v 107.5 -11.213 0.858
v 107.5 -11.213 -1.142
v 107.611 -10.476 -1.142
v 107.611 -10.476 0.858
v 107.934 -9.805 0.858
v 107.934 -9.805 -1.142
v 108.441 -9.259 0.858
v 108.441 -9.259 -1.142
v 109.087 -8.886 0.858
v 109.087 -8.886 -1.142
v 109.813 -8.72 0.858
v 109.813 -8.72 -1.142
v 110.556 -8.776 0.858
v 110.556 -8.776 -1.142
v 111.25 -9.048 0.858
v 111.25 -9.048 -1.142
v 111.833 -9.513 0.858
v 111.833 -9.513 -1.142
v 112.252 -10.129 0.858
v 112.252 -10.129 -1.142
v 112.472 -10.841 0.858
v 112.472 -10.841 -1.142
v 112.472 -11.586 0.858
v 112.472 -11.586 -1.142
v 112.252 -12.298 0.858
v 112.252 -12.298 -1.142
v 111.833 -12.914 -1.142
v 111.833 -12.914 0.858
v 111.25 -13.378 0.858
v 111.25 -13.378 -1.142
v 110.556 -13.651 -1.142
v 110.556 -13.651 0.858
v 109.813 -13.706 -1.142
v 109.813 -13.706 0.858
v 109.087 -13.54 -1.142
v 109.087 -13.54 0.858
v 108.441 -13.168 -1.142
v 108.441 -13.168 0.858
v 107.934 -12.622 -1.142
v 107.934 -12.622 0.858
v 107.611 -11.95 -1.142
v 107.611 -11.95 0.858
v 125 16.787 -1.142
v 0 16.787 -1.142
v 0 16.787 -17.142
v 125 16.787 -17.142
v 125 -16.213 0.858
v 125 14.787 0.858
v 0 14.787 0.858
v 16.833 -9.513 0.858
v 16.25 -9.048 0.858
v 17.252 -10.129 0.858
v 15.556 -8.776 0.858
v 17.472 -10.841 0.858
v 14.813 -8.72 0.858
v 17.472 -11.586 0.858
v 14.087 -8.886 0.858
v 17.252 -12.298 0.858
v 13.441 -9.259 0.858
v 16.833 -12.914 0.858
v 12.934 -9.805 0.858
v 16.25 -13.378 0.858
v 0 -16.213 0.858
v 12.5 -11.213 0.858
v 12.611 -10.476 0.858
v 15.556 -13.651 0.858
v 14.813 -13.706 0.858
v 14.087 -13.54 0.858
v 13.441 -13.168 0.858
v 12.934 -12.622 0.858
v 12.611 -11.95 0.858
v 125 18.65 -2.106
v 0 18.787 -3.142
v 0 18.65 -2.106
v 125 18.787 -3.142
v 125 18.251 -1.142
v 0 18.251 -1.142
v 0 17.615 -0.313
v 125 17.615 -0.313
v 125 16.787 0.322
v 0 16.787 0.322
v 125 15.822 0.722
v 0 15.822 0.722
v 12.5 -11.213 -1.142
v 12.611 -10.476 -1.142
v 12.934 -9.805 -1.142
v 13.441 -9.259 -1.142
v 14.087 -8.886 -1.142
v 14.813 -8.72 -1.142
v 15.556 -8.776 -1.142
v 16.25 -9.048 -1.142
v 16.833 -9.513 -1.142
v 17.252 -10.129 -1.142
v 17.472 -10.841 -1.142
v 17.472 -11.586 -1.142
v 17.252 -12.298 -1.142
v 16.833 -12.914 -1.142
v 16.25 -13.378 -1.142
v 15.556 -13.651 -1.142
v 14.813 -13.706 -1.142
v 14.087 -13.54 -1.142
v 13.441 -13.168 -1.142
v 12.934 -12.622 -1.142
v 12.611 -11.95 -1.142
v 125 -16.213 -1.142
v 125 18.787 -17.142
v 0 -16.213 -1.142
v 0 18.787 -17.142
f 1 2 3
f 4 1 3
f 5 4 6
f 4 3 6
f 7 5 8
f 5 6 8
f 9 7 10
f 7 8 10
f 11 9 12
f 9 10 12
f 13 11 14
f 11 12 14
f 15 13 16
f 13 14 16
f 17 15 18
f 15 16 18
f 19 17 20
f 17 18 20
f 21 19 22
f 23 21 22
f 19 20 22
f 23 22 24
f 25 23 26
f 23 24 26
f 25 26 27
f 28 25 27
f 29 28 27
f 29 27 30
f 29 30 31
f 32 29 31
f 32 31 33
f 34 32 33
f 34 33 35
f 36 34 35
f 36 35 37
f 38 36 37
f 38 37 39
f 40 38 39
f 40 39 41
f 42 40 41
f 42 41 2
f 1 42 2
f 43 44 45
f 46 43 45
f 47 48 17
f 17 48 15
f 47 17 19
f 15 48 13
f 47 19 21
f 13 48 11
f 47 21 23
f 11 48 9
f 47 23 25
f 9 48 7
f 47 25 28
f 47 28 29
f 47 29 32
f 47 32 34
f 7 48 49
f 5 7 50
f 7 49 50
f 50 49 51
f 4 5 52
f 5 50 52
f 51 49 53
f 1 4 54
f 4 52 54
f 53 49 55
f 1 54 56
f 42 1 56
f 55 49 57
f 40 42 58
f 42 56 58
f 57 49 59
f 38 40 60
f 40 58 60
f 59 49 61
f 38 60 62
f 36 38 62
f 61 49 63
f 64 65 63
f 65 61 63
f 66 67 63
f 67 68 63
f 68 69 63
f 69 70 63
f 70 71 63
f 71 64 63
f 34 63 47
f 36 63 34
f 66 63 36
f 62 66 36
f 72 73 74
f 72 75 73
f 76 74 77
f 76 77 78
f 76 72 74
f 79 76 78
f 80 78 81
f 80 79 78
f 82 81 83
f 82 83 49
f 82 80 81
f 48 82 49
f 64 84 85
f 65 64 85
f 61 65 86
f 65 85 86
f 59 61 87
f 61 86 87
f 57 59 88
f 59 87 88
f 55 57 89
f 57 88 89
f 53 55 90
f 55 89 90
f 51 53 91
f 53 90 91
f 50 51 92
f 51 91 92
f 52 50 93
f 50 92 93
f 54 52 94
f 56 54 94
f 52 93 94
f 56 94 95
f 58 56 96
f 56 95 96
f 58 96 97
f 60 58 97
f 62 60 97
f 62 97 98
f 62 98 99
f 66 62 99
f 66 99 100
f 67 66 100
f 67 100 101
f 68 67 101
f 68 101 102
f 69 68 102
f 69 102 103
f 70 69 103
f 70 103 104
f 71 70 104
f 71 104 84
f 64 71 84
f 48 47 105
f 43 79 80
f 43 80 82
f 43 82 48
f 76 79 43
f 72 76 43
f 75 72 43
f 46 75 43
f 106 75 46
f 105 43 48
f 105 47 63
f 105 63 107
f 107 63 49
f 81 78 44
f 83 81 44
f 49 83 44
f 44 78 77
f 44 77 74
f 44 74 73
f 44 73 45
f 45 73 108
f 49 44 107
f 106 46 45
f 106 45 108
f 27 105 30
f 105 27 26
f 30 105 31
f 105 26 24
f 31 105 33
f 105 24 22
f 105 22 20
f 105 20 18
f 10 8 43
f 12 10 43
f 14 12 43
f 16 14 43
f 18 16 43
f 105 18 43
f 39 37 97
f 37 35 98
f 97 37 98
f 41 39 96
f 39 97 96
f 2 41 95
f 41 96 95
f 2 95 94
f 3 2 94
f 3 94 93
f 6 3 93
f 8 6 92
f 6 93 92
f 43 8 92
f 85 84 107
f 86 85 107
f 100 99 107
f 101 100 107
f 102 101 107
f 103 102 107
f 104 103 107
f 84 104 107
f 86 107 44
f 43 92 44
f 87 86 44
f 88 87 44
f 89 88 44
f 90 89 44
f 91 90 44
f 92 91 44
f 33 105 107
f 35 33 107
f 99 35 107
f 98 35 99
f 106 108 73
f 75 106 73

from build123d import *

# Parameters (mm, degrees)
BOSS_EXTRUDE1_DEPTH = 125
FILLET1_R           = 4
SKETCH2_R           = 2.5
CUT_EXTRUDE1_DEPTH  = 125


with BuildPart() as part:
    # Sketch1 → Boss-Extrude1 (new body)
    with BuildSketch(Plane(origin=(0, 0, 0), x_dir=(0, 0, -1), z_dir=(1, 0, 0))):
        Polygon((1.141646312, 16.786775831), (17.141646312, 16.786775831), (17.141646312, 18.786775831), (-0.858353688, 18.786775831), (-0.858353688, -16.213224169), (1.141646312, -16.213224169), align=None)
    extrude(amount=BOSS_EXTRUDE1_DEPTH)

    # Fillet1
    fillet1_edges = [part.edges().sort_by_distance(p)[0] for p in [
        (62.5, 18.786775831, 0.858353688),
    ]]
    fillet(fillet1_edges, radius=FILLET1_R)

    # Sketch2 → Cut-Extrude1 (cut)
    with BuildSketch(Plane(origin=(0, 0, -1.141646312), x_dir=(-1, 0, 0), z_dir=(0, 0, -1))):
        with Locations((-110, -11.213224169)):
            Circle(SKETCH2_R)
        with Locations((-15, -11.213224169)):
            Circle(SKETCH2_R)
    extrude(amount=-CUT_EXTRUDE1_DEPTH, mode=Mode.SUBTRACT)


solid = part.part
